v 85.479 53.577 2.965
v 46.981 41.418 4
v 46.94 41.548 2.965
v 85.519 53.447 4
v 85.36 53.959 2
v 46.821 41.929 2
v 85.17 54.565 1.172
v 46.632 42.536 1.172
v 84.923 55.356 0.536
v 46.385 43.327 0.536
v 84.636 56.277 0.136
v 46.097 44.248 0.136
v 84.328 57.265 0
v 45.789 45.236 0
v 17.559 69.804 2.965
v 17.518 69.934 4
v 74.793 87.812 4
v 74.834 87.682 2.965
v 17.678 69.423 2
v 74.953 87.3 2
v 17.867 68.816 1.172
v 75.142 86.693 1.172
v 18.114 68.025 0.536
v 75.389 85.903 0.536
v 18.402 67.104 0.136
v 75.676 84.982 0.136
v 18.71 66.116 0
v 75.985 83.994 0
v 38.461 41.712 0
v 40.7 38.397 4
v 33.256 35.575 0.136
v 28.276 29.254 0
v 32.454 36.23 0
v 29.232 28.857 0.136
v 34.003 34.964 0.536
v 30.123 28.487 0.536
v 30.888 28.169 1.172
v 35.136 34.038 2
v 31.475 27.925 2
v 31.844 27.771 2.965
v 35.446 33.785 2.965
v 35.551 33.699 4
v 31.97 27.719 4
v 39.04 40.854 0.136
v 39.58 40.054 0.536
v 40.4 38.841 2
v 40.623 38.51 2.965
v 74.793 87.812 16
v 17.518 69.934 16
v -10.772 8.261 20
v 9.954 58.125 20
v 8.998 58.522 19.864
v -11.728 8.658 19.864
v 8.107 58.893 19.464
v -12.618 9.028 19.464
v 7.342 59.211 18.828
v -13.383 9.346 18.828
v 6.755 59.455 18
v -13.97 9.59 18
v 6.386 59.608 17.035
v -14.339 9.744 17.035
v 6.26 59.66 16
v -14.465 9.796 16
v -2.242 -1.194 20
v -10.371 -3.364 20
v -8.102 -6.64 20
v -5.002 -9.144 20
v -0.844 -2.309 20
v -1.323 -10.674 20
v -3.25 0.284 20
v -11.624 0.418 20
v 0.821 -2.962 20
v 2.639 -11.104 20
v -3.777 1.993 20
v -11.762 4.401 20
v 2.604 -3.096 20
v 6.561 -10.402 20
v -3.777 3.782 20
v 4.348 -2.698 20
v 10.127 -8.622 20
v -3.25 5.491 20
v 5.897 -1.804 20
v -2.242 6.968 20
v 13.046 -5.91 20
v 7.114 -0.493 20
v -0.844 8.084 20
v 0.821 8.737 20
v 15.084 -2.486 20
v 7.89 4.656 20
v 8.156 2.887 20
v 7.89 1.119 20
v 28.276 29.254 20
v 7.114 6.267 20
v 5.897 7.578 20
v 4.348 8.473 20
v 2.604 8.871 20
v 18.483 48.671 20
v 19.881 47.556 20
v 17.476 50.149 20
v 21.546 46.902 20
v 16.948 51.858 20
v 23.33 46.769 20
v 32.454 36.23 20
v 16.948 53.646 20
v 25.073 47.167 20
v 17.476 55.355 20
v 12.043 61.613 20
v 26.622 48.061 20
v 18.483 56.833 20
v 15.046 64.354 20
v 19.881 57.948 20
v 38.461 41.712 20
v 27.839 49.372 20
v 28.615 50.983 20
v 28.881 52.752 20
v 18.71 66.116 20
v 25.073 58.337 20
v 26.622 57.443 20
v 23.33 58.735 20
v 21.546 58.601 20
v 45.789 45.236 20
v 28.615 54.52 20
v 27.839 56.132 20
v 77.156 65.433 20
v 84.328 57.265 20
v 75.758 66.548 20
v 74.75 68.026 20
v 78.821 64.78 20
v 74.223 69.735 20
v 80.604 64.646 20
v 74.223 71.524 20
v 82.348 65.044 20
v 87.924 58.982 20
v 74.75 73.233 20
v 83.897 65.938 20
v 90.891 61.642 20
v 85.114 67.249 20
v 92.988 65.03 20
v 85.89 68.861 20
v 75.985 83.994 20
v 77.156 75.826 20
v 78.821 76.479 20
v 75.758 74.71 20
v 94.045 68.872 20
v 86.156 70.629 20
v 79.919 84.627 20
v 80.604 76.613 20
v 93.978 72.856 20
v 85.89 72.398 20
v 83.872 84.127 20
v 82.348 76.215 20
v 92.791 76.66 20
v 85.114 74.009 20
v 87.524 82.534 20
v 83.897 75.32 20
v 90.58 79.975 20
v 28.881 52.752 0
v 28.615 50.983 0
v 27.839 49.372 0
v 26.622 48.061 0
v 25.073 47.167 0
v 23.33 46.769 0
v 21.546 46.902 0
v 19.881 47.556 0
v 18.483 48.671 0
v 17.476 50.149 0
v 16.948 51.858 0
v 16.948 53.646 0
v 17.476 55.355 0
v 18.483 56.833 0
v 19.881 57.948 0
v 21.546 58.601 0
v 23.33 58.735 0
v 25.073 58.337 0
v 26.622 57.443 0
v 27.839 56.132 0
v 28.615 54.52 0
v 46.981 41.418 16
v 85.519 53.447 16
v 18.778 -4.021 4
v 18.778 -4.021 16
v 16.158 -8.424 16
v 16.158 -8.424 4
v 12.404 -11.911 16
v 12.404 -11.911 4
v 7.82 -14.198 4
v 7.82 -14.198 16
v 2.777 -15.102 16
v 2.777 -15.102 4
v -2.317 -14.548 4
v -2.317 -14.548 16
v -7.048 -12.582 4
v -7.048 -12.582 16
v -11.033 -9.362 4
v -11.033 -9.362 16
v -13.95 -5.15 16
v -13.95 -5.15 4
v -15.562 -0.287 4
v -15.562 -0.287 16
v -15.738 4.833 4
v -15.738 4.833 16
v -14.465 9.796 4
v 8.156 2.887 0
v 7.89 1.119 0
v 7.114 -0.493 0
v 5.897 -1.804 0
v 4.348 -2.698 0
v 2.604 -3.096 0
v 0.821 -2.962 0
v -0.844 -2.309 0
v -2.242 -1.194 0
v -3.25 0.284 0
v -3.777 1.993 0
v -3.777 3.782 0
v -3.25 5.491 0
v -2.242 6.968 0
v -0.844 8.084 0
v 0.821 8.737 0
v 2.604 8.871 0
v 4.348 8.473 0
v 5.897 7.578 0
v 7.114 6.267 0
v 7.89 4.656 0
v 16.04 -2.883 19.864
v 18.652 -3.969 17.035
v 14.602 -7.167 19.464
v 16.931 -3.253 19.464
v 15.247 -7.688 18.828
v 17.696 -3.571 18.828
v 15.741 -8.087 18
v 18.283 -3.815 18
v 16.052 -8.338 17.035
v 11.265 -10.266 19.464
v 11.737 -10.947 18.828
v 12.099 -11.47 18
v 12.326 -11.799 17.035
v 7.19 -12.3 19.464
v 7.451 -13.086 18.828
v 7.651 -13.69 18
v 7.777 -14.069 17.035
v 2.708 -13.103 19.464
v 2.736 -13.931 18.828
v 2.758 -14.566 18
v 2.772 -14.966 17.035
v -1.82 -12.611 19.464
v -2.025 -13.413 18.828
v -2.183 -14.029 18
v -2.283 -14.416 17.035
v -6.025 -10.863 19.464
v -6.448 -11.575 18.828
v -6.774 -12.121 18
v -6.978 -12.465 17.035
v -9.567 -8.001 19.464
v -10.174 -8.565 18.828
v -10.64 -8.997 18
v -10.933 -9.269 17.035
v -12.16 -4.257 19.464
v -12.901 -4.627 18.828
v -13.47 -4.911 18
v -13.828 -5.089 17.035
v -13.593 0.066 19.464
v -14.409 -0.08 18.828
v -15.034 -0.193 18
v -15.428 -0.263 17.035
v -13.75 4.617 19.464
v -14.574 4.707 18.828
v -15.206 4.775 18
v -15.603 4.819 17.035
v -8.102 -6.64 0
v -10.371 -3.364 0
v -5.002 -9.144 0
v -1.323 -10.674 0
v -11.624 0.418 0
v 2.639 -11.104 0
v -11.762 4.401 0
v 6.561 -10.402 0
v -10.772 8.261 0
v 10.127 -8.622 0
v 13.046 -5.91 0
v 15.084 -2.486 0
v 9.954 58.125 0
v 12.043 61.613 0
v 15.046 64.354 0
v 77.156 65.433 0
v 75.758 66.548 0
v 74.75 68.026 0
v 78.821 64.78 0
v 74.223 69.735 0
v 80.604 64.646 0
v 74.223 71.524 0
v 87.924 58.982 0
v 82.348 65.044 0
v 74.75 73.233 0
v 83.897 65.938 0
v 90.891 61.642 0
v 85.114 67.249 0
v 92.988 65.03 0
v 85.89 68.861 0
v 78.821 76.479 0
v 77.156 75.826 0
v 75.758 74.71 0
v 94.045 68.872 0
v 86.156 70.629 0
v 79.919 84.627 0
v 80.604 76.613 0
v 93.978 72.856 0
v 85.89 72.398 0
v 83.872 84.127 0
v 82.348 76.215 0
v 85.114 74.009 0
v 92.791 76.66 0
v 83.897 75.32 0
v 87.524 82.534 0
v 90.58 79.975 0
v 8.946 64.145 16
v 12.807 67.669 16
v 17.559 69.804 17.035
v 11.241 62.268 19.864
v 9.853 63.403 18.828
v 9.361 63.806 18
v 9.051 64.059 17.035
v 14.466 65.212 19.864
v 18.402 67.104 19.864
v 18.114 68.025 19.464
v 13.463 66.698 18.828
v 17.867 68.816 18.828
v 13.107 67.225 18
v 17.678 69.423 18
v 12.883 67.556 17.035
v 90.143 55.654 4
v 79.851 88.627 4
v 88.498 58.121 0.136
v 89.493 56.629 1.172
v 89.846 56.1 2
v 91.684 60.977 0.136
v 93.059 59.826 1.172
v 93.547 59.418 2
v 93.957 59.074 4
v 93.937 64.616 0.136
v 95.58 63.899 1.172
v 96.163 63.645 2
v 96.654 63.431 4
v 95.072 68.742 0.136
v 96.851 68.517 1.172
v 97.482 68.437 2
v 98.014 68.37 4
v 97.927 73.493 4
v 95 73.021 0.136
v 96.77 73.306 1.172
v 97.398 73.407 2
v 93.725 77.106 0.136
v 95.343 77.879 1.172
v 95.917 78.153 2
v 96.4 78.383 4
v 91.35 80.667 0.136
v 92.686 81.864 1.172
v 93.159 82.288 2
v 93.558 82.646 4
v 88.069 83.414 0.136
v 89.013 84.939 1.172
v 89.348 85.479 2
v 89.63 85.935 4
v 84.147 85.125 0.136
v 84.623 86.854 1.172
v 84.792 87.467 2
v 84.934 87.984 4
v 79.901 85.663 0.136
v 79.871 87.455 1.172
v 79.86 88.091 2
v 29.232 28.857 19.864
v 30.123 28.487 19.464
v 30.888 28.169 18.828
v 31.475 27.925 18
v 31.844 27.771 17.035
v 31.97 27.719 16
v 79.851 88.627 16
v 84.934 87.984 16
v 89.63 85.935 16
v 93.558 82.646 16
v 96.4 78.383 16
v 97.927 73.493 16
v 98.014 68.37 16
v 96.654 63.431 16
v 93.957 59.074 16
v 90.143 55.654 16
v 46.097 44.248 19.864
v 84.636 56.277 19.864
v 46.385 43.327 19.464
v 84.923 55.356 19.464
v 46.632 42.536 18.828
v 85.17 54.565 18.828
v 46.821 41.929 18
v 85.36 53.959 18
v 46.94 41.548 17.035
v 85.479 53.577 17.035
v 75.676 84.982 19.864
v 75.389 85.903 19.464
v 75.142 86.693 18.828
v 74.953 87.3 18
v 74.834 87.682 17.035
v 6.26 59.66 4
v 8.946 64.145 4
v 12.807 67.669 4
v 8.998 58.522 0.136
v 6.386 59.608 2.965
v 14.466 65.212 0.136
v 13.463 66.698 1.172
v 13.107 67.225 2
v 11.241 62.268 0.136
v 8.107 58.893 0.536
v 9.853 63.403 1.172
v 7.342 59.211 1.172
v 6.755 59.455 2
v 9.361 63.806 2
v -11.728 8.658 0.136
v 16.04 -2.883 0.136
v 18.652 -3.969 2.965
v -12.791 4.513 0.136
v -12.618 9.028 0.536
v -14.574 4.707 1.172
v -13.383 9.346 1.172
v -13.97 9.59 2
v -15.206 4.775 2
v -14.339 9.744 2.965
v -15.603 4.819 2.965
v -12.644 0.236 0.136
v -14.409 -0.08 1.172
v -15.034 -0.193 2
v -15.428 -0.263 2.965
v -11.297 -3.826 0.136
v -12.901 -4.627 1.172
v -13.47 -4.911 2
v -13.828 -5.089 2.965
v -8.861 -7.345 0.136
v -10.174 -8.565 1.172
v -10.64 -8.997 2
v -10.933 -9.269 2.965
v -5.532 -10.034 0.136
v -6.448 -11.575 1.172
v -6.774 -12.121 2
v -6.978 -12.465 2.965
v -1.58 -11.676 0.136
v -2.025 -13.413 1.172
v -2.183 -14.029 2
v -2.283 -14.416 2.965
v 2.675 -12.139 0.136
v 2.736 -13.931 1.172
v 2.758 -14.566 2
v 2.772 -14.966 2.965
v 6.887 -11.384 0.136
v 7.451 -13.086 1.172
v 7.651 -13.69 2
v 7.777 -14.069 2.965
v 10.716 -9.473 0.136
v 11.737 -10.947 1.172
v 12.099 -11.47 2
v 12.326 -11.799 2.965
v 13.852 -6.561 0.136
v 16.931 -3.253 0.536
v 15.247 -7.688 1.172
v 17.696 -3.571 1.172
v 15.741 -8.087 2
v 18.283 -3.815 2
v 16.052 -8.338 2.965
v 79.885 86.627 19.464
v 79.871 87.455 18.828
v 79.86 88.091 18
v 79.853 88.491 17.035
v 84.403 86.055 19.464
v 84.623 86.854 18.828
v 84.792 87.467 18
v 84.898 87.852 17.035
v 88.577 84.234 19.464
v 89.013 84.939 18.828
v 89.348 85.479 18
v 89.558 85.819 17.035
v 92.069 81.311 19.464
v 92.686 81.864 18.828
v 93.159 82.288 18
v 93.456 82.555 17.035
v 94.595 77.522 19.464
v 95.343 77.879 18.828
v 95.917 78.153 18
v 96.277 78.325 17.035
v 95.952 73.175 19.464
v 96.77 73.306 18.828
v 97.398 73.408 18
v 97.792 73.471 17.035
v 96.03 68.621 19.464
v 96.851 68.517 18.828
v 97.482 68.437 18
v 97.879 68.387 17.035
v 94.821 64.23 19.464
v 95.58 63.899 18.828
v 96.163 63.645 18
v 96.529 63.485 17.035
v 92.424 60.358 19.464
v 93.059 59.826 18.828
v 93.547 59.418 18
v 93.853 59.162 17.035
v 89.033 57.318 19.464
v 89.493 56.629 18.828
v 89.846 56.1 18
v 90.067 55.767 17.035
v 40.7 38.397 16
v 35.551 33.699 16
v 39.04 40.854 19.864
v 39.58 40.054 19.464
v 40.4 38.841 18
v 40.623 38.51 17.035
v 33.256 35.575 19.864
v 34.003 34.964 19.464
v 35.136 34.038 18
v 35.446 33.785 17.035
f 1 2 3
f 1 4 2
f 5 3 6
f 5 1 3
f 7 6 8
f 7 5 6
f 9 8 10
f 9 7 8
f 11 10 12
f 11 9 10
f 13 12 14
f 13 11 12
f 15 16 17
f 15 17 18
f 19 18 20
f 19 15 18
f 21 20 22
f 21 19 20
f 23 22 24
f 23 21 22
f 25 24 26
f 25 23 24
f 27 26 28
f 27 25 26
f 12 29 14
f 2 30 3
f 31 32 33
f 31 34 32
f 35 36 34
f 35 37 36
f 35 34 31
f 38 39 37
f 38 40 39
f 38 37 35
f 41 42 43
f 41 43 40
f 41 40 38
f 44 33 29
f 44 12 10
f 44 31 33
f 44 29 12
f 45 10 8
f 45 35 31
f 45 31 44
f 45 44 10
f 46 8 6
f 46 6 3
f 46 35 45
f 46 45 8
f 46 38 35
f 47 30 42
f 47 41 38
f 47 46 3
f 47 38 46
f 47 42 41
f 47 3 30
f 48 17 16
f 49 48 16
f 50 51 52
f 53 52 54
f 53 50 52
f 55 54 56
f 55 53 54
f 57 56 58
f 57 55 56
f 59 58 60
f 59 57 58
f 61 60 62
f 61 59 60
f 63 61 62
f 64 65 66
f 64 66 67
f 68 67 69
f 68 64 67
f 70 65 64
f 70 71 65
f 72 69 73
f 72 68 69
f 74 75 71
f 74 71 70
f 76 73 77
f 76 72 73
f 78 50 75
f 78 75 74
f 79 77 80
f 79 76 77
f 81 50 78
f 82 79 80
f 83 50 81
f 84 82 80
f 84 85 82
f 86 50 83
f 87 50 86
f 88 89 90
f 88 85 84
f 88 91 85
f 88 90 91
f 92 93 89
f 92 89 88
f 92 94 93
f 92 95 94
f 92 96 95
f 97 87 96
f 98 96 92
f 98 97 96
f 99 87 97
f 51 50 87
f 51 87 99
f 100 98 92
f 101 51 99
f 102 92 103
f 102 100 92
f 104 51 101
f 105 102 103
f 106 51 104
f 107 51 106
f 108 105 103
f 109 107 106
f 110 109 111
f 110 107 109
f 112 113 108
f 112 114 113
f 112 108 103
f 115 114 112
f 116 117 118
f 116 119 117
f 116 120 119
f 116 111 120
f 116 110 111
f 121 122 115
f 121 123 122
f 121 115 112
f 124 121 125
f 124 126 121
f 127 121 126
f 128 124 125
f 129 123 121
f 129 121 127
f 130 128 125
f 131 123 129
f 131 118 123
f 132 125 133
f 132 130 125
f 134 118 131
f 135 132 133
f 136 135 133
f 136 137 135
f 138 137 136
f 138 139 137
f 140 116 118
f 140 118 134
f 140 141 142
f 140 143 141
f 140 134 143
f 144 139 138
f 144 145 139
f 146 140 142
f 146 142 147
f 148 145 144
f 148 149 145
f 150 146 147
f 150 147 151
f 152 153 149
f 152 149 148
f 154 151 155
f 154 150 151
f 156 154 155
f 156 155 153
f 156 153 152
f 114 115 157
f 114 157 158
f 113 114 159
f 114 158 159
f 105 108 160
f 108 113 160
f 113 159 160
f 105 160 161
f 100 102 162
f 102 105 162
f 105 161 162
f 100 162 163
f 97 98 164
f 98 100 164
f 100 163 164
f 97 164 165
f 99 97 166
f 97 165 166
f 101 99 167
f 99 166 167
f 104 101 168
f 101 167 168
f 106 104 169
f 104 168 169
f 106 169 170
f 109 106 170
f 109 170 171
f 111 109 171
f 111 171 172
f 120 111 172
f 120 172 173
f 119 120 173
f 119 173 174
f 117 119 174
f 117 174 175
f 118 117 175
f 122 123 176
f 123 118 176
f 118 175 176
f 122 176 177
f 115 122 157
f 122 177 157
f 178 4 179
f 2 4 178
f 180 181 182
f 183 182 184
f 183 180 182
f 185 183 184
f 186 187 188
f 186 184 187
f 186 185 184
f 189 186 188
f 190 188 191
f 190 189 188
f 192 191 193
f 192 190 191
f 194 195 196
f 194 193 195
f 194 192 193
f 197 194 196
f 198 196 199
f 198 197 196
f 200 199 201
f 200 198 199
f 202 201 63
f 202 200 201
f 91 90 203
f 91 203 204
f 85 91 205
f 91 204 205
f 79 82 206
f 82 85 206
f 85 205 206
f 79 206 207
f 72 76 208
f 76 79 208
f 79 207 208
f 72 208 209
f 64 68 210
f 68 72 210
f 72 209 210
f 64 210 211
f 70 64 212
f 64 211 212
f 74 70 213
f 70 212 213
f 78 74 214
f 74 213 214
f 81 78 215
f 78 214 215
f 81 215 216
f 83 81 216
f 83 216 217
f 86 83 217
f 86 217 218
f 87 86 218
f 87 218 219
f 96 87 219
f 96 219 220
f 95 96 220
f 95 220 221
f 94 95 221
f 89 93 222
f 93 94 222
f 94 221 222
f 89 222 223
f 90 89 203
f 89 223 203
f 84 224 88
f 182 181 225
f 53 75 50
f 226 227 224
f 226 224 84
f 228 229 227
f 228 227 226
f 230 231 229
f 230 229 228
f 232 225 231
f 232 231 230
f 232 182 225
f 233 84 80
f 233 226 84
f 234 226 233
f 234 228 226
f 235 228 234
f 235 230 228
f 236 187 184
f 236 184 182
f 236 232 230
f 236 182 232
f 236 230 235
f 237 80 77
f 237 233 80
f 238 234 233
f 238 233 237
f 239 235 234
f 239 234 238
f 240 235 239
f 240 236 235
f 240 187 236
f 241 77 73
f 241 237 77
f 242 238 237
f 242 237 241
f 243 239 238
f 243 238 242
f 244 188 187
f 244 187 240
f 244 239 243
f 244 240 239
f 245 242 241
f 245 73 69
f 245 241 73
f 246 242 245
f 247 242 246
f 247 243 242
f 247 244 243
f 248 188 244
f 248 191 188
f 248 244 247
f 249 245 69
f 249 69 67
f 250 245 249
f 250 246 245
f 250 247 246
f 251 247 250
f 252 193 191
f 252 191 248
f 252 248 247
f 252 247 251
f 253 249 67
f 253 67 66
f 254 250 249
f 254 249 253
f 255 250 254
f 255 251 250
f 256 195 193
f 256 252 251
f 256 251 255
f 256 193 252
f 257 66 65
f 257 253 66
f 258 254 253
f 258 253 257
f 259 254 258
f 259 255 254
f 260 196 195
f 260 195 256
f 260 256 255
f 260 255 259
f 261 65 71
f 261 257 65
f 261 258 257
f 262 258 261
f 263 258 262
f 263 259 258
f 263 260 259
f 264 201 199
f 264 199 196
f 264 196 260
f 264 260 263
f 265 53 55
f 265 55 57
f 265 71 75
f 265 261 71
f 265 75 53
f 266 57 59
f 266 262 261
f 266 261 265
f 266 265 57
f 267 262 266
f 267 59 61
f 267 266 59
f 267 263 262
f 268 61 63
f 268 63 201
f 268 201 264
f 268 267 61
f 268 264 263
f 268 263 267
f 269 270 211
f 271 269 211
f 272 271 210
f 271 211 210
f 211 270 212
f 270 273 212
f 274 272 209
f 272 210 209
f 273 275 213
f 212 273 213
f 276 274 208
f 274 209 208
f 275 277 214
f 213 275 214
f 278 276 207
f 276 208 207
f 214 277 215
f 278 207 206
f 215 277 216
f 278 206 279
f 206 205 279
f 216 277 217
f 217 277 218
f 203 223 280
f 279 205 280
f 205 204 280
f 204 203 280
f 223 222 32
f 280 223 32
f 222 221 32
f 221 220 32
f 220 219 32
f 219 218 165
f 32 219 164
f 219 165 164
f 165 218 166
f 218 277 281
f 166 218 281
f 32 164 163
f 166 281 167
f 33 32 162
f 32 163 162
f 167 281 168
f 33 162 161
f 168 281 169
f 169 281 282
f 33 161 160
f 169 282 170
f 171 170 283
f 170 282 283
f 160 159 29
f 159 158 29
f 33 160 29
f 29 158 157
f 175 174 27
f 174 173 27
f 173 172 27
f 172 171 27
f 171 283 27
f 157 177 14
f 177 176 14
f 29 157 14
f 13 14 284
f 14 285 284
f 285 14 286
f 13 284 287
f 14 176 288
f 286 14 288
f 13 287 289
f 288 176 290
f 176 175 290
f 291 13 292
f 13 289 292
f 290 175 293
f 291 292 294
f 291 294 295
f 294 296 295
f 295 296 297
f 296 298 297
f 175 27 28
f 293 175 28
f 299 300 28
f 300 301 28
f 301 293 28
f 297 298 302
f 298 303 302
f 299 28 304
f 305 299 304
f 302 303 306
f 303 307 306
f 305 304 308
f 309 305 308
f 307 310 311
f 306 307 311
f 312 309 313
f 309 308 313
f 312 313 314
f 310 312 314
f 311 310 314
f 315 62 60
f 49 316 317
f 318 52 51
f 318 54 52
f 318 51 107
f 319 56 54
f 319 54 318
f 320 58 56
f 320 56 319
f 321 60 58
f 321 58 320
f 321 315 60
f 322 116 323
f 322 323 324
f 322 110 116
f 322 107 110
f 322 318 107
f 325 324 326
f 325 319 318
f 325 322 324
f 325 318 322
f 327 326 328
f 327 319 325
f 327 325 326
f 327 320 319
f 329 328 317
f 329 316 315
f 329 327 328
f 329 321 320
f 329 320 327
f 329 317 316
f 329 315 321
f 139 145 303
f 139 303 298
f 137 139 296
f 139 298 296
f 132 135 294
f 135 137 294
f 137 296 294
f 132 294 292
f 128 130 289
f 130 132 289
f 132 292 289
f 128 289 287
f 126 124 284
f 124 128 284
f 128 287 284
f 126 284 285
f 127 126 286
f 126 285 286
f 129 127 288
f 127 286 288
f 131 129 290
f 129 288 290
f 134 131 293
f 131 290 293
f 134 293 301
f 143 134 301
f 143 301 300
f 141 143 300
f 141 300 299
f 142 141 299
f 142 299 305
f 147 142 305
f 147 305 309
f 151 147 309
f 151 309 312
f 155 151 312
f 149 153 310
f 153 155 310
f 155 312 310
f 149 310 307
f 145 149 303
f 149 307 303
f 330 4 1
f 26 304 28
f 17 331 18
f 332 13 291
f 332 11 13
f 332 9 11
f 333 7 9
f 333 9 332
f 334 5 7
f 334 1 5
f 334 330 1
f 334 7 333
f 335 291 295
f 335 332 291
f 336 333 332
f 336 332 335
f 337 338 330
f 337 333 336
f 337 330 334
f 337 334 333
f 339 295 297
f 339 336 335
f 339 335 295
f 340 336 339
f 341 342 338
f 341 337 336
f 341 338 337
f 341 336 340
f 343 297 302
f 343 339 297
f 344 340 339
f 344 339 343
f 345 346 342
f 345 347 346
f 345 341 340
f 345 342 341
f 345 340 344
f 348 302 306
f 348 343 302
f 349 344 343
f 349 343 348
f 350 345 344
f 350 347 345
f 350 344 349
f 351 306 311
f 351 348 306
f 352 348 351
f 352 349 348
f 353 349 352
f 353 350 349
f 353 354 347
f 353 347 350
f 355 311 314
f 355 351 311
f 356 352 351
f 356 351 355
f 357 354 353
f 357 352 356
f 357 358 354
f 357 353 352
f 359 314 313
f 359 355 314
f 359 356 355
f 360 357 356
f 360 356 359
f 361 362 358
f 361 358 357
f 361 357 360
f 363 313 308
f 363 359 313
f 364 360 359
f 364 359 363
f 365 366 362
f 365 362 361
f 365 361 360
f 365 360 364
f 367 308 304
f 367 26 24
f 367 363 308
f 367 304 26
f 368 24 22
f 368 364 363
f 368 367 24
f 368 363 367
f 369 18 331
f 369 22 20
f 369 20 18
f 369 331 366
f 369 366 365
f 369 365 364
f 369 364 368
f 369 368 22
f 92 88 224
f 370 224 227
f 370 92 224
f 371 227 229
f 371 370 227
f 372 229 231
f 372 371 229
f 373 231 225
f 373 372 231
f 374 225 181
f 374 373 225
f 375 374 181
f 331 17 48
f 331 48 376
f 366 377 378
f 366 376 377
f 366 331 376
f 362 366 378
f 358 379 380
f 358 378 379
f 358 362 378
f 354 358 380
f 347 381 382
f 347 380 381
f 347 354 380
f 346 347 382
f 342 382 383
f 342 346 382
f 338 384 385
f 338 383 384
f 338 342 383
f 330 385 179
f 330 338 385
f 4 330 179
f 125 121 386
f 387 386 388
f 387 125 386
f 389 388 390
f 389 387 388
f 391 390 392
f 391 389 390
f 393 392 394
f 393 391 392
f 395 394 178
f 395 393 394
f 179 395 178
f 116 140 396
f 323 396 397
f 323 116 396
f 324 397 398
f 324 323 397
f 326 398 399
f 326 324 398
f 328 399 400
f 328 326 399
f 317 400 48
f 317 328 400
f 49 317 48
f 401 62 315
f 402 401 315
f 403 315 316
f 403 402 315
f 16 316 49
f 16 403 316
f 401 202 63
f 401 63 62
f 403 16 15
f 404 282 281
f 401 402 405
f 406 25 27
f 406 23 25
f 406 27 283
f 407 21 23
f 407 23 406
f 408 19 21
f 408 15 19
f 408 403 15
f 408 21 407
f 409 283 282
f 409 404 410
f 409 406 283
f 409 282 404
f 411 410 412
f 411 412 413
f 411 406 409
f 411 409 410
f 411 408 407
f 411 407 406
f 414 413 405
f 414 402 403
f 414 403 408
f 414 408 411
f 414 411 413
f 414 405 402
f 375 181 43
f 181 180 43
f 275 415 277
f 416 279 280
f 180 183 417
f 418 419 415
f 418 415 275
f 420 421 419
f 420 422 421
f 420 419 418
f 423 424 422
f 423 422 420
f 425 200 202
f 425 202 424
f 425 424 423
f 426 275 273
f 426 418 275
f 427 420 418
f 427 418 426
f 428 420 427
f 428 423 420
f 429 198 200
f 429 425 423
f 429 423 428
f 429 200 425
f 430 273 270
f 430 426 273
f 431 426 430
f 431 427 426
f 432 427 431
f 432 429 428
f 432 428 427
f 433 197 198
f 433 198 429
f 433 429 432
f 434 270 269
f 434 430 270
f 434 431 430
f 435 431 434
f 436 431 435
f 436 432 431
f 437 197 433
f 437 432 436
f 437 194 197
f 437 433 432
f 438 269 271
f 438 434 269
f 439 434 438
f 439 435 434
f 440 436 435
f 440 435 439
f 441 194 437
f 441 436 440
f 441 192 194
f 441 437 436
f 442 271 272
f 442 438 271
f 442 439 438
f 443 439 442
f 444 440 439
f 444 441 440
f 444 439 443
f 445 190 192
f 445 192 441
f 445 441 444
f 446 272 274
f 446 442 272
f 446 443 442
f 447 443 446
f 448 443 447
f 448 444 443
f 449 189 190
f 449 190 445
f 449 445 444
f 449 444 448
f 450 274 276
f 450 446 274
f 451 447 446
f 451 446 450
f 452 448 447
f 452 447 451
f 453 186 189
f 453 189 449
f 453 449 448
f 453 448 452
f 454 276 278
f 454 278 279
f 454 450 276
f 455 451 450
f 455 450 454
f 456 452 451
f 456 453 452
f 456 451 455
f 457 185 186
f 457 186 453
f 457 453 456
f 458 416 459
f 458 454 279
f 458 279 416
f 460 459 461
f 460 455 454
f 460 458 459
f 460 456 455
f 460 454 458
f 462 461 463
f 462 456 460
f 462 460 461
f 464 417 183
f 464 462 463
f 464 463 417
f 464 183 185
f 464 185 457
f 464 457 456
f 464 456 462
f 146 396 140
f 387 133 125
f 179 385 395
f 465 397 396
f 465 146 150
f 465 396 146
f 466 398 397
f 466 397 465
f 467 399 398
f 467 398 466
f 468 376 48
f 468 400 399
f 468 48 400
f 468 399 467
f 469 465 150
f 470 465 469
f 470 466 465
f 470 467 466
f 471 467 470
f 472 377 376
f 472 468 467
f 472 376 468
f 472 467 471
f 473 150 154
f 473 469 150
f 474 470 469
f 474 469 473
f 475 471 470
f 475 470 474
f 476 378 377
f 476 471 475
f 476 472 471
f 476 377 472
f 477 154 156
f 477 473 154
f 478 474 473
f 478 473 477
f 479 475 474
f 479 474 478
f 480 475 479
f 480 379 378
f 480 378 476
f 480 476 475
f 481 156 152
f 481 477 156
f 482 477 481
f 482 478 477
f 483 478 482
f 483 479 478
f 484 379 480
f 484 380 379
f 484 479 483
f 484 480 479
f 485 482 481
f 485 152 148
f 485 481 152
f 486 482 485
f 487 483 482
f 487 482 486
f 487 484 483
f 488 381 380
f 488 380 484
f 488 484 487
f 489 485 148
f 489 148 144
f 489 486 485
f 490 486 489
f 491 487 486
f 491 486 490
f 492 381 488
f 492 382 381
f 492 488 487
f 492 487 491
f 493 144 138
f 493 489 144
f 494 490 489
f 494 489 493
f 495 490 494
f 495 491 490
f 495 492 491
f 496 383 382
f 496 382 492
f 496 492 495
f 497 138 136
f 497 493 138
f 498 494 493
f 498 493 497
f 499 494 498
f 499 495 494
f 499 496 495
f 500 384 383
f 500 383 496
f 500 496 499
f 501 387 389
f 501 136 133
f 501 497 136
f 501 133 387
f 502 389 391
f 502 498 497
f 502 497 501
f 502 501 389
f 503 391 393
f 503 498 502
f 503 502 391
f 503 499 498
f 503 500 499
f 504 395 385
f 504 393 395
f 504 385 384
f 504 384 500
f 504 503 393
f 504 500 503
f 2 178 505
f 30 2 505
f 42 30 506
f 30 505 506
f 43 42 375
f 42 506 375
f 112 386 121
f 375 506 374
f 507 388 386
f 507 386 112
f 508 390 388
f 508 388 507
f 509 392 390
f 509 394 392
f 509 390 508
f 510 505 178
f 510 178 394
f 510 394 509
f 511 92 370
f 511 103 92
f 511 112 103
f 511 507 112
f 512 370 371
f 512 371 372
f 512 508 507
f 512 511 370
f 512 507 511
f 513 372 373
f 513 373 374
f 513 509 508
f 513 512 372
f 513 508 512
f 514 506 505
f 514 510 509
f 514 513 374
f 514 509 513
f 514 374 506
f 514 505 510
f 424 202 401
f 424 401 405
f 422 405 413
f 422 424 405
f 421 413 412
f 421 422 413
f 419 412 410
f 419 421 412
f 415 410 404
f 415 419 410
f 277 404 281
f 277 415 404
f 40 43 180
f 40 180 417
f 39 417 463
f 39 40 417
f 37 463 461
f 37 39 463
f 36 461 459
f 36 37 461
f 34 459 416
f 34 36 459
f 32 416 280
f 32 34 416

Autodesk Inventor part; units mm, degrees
ref_plane "YZ Plane" through (0, 0, 0) normal (1, 0, 0) x (0, 1, 0)
ref_plane "XZ Plane" through (0, 0, 0) normal (0, 1, 0) x (-1, 0, 0)
ref_plane "XY Plane" through (0, 0, 0) normal (0, 0, 1) x (1, 0, 0)
sketch "Sketch1" plane through (0, 0, 0) normal (0, 0, 1) x (1, 0, 0)
  circle A0 centre (2.1561, 2.8874) radius 18
  circle A1 centre (80.1561, 70.6294) radius 18
  circle A2 centre (22.8814, 52.7519) radius 18
  line L0 (74.7929, 87.8119) -> (17.5182, 69.9343)
  line L1 (-14.4653, 9.7959) -> (6.2599, 59.6603)
  line L2 (18.7776, -4.021) -> (39.5029, 45.8434)
  line L3 (85.5194, 53.447) -> (28.2447, 35.5695)
  circle A3 centre (2.1561, 2.8874) radius 6
  circle A4 centre (22.8814, 52.7519) radius 6
  circle A5 centre (80.1561, 70.6294) radius 6
  point P0 (0, 0)
  point P1 (36.2744, 38.0758)
  dimension "d0" = 36
  dimension "d1" = 36
  dimension "d2" = 54
  dimension "d3" = 60
  dimension "d6" = 12
extrude "Extrusion1" add sketch "Sketch1" along normal blind 20
fillet "Fillet2" radius 24 1 edges at (36.2744, 38.0758, 10)
fillet "Fillet1" radius 4 14 edges at (10.748, 66.0477, 20) (-4.1027, 34.7281, 20) (-4.7523, -13.734, 20) (25.3737, 11.849, 20) (97.3386, 75.9927, 20) (66.2501, 47.4324, 20) (46.1555, 78.8731, 20) (10.748, 66.0477, 0) (-4.1027, 34.7281, 0) (-4.7523, -13.734, 0) (25.3737, 11.849, 0) (97.3386, 75.9927, 0) (66.2501, 47.4324, 0) (46.1555, 78.8731, 0)
properties part number "SteelPost"
